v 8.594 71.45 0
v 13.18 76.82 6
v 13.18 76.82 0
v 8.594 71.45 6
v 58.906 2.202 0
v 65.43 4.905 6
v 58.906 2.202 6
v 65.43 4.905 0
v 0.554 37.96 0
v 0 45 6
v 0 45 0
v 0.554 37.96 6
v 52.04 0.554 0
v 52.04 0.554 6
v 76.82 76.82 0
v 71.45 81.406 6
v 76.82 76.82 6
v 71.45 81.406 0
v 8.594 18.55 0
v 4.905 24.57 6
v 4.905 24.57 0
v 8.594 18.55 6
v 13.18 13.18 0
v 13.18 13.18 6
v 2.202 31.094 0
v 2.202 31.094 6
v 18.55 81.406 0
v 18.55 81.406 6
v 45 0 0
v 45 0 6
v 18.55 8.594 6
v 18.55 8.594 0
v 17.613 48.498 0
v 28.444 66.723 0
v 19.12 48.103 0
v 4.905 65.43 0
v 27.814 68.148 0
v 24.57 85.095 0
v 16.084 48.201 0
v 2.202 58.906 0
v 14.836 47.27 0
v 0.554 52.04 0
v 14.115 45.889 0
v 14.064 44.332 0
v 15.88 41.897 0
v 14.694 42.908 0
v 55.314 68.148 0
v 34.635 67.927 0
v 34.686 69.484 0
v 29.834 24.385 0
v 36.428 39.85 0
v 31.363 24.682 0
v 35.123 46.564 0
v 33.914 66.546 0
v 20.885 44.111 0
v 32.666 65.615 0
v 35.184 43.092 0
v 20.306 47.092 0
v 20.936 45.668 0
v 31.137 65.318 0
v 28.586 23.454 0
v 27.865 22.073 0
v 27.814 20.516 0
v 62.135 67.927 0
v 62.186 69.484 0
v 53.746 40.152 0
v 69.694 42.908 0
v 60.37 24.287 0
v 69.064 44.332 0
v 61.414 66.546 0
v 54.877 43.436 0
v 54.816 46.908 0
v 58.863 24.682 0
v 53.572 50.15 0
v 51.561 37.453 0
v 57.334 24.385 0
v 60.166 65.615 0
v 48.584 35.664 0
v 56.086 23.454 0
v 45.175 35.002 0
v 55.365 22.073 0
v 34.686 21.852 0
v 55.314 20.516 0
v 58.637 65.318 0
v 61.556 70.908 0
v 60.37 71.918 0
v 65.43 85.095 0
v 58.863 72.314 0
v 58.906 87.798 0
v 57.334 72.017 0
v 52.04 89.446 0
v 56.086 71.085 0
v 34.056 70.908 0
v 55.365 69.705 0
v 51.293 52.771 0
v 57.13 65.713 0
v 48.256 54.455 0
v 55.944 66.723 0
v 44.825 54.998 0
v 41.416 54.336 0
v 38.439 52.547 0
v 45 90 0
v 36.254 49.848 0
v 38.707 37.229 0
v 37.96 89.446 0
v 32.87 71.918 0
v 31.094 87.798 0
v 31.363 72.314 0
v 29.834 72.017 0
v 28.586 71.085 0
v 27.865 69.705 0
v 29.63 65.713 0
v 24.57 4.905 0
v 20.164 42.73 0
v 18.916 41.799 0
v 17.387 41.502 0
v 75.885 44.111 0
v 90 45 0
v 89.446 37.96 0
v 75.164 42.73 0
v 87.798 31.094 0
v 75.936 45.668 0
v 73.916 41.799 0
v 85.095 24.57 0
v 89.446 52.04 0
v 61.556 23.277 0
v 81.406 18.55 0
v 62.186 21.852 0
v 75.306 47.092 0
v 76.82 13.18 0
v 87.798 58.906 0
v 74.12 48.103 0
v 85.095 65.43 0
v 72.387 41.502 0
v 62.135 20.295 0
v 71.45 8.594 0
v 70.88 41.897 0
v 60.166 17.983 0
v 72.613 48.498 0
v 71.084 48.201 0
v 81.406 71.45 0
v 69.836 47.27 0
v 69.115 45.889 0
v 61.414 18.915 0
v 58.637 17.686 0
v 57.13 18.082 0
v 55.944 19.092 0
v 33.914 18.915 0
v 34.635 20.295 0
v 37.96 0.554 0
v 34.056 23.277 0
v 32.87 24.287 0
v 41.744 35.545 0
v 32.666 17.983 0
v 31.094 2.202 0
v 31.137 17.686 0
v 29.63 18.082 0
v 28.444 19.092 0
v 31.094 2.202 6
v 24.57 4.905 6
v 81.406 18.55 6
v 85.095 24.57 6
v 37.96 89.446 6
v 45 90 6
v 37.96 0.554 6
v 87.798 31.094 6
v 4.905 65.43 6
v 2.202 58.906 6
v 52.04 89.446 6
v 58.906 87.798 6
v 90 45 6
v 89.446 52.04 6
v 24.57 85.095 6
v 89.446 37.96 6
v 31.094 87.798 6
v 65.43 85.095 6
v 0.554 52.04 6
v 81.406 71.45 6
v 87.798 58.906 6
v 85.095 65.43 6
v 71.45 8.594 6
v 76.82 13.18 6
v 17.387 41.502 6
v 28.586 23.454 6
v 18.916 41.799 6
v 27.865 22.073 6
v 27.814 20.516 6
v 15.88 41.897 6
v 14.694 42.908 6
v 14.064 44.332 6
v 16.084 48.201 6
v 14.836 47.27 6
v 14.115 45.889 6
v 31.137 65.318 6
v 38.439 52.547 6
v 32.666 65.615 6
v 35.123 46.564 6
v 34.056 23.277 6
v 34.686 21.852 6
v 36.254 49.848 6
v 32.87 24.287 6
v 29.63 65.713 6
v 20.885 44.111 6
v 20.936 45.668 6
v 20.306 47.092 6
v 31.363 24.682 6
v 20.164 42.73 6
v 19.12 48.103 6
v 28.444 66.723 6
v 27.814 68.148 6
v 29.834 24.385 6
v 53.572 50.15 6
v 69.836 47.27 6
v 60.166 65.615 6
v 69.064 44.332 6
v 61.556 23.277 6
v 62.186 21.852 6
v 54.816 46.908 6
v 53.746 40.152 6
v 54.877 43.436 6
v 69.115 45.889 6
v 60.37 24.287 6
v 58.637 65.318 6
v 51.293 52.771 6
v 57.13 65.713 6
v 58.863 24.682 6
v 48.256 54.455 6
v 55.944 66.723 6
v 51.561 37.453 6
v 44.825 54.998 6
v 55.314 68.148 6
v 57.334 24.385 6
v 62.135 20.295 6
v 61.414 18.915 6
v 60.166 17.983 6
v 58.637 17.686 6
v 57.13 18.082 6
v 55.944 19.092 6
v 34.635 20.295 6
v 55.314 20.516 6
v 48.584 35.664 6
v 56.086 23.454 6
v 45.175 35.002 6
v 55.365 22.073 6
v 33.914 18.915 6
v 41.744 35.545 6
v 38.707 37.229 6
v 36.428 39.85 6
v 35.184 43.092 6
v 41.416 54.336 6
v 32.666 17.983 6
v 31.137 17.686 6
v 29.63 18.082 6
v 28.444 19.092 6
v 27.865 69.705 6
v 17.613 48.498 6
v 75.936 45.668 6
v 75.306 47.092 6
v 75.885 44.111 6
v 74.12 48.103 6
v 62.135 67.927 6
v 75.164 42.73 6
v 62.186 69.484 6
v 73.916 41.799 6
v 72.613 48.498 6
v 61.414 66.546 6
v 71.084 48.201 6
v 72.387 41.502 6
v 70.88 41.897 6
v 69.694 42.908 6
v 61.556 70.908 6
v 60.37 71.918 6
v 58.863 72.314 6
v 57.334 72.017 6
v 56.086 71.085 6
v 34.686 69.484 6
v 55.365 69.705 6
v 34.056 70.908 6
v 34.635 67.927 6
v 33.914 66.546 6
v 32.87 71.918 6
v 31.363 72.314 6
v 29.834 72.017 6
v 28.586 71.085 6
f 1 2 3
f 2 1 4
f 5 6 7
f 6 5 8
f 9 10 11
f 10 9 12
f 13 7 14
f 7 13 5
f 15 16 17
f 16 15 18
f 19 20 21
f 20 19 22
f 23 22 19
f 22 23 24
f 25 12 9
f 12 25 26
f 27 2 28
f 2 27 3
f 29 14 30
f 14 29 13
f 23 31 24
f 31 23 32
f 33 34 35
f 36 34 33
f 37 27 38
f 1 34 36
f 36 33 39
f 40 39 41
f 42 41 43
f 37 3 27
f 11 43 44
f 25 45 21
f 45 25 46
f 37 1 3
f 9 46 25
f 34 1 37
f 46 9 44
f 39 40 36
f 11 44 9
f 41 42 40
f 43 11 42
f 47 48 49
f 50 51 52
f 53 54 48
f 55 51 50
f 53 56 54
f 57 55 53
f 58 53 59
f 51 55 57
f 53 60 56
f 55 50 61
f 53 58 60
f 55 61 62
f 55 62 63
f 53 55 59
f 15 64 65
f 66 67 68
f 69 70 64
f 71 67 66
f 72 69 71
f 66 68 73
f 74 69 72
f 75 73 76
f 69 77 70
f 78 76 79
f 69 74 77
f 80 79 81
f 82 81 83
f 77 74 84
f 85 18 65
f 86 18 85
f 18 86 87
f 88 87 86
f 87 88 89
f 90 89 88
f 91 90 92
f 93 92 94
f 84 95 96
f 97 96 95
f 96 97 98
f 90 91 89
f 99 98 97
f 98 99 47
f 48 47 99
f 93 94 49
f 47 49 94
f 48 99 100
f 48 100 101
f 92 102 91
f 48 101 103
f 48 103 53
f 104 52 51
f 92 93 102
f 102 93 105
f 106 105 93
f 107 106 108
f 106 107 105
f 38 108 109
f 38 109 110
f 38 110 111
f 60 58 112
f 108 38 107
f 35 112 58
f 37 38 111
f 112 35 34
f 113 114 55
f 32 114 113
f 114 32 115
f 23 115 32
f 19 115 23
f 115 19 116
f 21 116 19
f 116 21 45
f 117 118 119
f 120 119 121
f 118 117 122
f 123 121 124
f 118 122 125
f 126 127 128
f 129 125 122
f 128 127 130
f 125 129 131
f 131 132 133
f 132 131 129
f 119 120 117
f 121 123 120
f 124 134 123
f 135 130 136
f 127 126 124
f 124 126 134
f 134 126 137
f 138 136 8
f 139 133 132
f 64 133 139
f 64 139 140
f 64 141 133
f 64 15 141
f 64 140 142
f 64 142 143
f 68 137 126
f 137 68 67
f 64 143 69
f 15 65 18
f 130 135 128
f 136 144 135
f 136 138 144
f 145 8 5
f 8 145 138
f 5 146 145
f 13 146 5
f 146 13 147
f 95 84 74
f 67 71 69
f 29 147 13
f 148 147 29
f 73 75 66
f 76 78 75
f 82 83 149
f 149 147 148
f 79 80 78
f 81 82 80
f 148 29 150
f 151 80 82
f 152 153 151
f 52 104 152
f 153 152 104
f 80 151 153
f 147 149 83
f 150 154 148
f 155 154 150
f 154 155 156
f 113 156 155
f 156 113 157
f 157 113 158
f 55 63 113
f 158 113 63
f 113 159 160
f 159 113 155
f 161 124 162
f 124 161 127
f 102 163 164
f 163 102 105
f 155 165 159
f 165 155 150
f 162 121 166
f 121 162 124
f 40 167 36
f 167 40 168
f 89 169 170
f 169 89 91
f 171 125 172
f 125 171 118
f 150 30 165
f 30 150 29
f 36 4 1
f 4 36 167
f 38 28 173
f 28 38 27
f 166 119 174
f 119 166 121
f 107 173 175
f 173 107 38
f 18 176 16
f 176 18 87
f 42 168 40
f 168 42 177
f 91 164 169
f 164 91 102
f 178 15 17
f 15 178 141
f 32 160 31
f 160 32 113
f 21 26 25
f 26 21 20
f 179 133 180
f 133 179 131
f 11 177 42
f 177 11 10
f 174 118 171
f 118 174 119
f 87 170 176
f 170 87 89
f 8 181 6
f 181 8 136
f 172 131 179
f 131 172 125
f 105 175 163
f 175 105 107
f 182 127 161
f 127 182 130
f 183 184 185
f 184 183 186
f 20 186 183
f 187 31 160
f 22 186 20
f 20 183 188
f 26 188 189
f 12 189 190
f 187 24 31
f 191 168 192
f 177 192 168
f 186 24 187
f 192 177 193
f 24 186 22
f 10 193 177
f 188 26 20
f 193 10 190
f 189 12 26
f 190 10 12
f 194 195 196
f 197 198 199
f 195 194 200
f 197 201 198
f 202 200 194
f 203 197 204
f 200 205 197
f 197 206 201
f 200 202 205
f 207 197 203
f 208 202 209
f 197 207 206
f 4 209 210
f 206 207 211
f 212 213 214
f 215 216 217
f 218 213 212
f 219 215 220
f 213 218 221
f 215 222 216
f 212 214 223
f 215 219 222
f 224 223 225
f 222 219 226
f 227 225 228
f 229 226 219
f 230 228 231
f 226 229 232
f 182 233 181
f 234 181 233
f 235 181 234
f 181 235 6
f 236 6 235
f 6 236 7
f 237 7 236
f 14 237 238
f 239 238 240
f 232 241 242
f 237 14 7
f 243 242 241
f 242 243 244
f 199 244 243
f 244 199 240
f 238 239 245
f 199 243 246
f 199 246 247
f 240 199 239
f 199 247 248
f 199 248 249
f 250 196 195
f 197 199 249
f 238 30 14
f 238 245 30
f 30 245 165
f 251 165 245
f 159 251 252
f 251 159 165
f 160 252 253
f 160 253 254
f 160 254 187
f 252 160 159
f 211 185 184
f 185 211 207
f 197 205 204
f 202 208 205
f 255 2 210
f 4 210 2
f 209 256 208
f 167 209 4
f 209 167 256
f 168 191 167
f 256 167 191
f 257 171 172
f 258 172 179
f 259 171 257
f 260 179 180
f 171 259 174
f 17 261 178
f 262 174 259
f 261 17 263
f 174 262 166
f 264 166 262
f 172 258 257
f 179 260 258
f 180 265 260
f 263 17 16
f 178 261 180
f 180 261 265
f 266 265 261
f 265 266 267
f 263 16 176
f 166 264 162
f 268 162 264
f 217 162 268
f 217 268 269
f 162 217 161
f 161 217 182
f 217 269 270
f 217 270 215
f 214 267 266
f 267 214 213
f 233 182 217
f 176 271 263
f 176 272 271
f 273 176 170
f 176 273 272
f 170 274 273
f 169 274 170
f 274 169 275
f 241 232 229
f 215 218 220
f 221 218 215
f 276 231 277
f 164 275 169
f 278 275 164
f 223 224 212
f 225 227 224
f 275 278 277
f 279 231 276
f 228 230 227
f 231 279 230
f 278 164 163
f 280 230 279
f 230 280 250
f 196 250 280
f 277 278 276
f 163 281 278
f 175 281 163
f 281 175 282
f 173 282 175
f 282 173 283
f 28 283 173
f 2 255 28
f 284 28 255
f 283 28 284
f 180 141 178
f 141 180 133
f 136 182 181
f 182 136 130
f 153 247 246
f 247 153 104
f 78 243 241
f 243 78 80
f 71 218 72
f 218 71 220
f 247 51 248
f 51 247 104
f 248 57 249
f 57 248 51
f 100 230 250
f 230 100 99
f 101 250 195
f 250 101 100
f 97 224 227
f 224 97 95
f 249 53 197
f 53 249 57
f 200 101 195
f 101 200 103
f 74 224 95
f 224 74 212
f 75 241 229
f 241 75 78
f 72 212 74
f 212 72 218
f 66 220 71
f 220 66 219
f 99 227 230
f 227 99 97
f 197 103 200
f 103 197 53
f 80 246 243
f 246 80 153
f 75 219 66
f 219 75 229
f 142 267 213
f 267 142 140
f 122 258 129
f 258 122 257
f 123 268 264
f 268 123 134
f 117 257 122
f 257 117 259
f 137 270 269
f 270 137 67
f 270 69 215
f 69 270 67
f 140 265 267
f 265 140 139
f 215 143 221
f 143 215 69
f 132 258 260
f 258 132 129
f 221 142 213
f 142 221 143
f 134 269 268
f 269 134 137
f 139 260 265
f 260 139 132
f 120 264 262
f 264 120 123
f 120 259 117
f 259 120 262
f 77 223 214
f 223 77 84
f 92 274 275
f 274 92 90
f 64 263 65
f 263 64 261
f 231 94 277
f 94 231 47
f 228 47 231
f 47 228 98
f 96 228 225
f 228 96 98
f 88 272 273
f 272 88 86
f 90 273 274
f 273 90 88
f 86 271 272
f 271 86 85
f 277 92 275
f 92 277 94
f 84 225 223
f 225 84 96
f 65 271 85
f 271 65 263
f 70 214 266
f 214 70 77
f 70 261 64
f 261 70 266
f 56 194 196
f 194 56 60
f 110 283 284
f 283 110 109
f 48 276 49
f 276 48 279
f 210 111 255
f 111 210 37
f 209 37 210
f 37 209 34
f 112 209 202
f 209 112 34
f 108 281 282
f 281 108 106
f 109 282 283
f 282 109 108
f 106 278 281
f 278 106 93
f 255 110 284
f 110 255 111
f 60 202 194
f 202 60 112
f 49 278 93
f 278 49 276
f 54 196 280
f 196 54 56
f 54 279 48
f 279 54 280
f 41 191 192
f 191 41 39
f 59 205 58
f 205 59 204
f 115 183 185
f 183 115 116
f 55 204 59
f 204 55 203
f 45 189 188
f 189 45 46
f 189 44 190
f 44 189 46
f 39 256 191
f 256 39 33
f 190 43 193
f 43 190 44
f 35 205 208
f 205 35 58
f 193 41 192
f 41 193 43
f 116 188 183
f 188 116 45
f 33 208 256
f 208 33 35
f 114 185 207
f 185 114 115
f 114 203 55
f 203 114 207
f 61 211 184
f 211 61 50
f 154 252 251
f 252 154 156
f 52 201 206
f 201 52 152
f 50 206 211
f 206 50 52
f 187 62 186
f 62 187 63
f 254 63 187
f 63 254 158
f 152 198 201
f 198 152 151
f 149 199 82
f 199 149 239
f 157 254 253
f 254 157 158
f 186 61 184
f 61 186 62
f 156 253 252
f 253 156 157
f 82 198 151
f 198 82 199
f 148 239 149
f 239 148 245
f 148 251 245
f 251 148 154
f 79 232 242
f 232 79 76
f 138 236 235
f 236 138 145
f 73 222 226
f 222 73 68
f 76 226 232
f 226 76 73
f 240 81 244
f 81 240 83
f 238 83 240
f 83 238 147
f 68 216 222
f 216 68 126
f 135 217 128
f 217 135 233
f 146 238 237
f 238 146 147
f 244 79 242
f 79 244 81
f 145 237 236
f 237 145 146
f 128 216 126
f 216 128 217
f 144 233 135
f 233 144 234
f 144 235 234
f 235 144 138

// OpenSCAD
$fn = 32;

// ----------------------------------------------------------------------
// Spacer plate: round flange R45, 6 bolts
// ----------------------------------------------------------------------

// --- parameters (mm) ---
bore_r = 10;              // centre bore radius
bolt_r = 3.5;             // bolt hole radius
plate_t = 6;              // plate thickness, Z (extrusion height)
flange_r = 45;            // flange radius
n_bolt = 6;               // bolt hole count
ring_r = 27.5;            // bolt circle radius
fit_tol = 0.02;           // declared fit tolerance (prompt contract)
free_tol = 0.2;           // declared free tolerance (prompt contract)

profile = [[90, 45], [89.446, 52.04], [87.798, 58.906], [85.095, 65.43], [81.406, 71.45], [76.82, 76.82], [71.45, 81.406], [65.43, 85.095], [58.906, 87.798], [52.04, 89.446], [45, 90], [37.96, 89.446], [31.094, 87.798], [24.57, 85.095], [18.55, 81.406], [13.18, 76.82], [8.594, 71.45], [4.905, 65.43], [2.202, 58.906], [0.554, 52.04], [0, 45], [0.554, 37.96], [2.202, 31.094], [4.905, 24.57], [8.594, 18.55], [13.18, 13.18], [18.55, 8.594], [24.57, 4.905], [31.094, 2.202], [37.96, 0.554], [45, 0], [52.04, 0.554], [58.906, 2.202], [65.43, 4.905], [71.45, 8.594], [76.82, 13.18], [81.406, 18.55], [85.095, 24.57], [87.798, 31.094], [89.446, 37.96]];  // primary outline, 40 points, counter clockwise
void_1 = [[54.816, 46.908], [53.572, 50.15], [51.293, 52.771], [48.256, 54.455], [44.825, 54.998], [41.416, 54.336], [38.439, 52.547], [36.254, 49.848], [35.123, 46.564], [35.184, 43.092], [36.428, 39.85], [38.707, 37.229], [41.744, 35.545], [45.175, 35.002], [48.584, 35.664], [51.561, 37.453], [53.746, 40.152], [54.877, 43.436]];  // centre bore, 18 points
void_2 = [[75.936, 45.668], [75.306, 47.092], [74.12, 48.103], [72.613, 48.498], [71.084, 48.201], [69.836, 47.27], [69.115, 45.889], [69.064, 44.332], [69.694, 42.908], [70.88, 41.897], [72.387, 41.502], [73.916, 41.799], [75.164, 42.73], [75.885, 44.111]];  // bolt hole 1, 14 points
void_3 = [[62.186, 69.484], [61.556, 70.908], [60.37, 71.918], [58.863, 72.314], [57.334, 72.017], [56.086, 71.085], [55.365, 69.705], [55.314, 68.148], [55.944, 66.723], [57.13, 65.713], [58.637, 65.318], [60.166, 65.615], [61.414, 66.546], [62.135, 67.927]];  // bolt hole 2, 14 points
void_4 = [[34.686, 69.484], [34.056, 70.908], [32.87, 71.918], [31.363, 72.314], [29.834, 72.017], [28.586, 71.085], [27.865, 69.705], [27.814, 68.148], [28.444, 66.723], [29.63, 65.713], [31.137, 65.318], [32.666, 65.615], [33.914, 66.546], [34.635, 67.927]];  // bolt hole 3, 14 points
void_5 = [[20.936, 45.668], [20.306, 47.092], [19.12, 48.103], [17.613, 48.498], [16.084, 48.201], [14.836, 47.27], [14.115, 45.889], [14.064, 44.332], [14.694, 42.908], [15.88, 41.897], [17.387, 41.502], [18.916, 41.799], [20.164, 42.73], [20.885, 44.111]];  // bolt hole 4, 14 points
void_6 = [[34.686, 21.852], [34.056, 23.277], [32.87, 24.287], [31.363, 24.682], [29.834, 24.385], [28.586, 23.454], [27.865, 22.073], [27.814, 20.516], [28.444, 19.092], [29.63, 18.082], [31.137, 17.686], [32.666, 17.983], [33.914, 18.915], [34.635, 20.295]];  // bolt hole 5, 14 points
void_7 = [[62.186, 21.852], [61.556, 23.277], [60.37, 24.287], [58.863, 24.682], [57.334, 24.385], [56.086, 23.454], [55.365, 22.073], [55.314, 20.516], [55.944, 19.092], [57.13, 18.082], [58.637, 17.686], [60.166, 17.983], [61.414, 18.915], [62.135, 20.295]];  // bolt hole 6, 14 points

// --- the one profile operation ---
difference() {
  linear_extrude(height = plate_t) polygon(points = profile);
  translate([0, 0, -1])
    linear_extrude(height = plate_t + 2) polygon(points = void_1);
  translate([0, 0, -1])
    linear_extrude(height = plate_t + 2) polygon(points = void_2);
  translate([0, 0, -1])
    linear_extrude(height = plate_t + 2) polygon(points = void_3);
  translate([0, 0, -1])
    linear_extrude(height = plate_t + 2) polygon(points = void_4);
  translate([0, 0, -1])
    linear_extrude(height = plate_t + 2) polygon(points = void_5);
  translate([0, 0, -1])
    linear_extrude(height = plate_t + 2) polygon(points = void_6);
  translate([0, 0, -1])
    linear_extrude(height = plate_t + 2) polygon(points = void_7);
}
